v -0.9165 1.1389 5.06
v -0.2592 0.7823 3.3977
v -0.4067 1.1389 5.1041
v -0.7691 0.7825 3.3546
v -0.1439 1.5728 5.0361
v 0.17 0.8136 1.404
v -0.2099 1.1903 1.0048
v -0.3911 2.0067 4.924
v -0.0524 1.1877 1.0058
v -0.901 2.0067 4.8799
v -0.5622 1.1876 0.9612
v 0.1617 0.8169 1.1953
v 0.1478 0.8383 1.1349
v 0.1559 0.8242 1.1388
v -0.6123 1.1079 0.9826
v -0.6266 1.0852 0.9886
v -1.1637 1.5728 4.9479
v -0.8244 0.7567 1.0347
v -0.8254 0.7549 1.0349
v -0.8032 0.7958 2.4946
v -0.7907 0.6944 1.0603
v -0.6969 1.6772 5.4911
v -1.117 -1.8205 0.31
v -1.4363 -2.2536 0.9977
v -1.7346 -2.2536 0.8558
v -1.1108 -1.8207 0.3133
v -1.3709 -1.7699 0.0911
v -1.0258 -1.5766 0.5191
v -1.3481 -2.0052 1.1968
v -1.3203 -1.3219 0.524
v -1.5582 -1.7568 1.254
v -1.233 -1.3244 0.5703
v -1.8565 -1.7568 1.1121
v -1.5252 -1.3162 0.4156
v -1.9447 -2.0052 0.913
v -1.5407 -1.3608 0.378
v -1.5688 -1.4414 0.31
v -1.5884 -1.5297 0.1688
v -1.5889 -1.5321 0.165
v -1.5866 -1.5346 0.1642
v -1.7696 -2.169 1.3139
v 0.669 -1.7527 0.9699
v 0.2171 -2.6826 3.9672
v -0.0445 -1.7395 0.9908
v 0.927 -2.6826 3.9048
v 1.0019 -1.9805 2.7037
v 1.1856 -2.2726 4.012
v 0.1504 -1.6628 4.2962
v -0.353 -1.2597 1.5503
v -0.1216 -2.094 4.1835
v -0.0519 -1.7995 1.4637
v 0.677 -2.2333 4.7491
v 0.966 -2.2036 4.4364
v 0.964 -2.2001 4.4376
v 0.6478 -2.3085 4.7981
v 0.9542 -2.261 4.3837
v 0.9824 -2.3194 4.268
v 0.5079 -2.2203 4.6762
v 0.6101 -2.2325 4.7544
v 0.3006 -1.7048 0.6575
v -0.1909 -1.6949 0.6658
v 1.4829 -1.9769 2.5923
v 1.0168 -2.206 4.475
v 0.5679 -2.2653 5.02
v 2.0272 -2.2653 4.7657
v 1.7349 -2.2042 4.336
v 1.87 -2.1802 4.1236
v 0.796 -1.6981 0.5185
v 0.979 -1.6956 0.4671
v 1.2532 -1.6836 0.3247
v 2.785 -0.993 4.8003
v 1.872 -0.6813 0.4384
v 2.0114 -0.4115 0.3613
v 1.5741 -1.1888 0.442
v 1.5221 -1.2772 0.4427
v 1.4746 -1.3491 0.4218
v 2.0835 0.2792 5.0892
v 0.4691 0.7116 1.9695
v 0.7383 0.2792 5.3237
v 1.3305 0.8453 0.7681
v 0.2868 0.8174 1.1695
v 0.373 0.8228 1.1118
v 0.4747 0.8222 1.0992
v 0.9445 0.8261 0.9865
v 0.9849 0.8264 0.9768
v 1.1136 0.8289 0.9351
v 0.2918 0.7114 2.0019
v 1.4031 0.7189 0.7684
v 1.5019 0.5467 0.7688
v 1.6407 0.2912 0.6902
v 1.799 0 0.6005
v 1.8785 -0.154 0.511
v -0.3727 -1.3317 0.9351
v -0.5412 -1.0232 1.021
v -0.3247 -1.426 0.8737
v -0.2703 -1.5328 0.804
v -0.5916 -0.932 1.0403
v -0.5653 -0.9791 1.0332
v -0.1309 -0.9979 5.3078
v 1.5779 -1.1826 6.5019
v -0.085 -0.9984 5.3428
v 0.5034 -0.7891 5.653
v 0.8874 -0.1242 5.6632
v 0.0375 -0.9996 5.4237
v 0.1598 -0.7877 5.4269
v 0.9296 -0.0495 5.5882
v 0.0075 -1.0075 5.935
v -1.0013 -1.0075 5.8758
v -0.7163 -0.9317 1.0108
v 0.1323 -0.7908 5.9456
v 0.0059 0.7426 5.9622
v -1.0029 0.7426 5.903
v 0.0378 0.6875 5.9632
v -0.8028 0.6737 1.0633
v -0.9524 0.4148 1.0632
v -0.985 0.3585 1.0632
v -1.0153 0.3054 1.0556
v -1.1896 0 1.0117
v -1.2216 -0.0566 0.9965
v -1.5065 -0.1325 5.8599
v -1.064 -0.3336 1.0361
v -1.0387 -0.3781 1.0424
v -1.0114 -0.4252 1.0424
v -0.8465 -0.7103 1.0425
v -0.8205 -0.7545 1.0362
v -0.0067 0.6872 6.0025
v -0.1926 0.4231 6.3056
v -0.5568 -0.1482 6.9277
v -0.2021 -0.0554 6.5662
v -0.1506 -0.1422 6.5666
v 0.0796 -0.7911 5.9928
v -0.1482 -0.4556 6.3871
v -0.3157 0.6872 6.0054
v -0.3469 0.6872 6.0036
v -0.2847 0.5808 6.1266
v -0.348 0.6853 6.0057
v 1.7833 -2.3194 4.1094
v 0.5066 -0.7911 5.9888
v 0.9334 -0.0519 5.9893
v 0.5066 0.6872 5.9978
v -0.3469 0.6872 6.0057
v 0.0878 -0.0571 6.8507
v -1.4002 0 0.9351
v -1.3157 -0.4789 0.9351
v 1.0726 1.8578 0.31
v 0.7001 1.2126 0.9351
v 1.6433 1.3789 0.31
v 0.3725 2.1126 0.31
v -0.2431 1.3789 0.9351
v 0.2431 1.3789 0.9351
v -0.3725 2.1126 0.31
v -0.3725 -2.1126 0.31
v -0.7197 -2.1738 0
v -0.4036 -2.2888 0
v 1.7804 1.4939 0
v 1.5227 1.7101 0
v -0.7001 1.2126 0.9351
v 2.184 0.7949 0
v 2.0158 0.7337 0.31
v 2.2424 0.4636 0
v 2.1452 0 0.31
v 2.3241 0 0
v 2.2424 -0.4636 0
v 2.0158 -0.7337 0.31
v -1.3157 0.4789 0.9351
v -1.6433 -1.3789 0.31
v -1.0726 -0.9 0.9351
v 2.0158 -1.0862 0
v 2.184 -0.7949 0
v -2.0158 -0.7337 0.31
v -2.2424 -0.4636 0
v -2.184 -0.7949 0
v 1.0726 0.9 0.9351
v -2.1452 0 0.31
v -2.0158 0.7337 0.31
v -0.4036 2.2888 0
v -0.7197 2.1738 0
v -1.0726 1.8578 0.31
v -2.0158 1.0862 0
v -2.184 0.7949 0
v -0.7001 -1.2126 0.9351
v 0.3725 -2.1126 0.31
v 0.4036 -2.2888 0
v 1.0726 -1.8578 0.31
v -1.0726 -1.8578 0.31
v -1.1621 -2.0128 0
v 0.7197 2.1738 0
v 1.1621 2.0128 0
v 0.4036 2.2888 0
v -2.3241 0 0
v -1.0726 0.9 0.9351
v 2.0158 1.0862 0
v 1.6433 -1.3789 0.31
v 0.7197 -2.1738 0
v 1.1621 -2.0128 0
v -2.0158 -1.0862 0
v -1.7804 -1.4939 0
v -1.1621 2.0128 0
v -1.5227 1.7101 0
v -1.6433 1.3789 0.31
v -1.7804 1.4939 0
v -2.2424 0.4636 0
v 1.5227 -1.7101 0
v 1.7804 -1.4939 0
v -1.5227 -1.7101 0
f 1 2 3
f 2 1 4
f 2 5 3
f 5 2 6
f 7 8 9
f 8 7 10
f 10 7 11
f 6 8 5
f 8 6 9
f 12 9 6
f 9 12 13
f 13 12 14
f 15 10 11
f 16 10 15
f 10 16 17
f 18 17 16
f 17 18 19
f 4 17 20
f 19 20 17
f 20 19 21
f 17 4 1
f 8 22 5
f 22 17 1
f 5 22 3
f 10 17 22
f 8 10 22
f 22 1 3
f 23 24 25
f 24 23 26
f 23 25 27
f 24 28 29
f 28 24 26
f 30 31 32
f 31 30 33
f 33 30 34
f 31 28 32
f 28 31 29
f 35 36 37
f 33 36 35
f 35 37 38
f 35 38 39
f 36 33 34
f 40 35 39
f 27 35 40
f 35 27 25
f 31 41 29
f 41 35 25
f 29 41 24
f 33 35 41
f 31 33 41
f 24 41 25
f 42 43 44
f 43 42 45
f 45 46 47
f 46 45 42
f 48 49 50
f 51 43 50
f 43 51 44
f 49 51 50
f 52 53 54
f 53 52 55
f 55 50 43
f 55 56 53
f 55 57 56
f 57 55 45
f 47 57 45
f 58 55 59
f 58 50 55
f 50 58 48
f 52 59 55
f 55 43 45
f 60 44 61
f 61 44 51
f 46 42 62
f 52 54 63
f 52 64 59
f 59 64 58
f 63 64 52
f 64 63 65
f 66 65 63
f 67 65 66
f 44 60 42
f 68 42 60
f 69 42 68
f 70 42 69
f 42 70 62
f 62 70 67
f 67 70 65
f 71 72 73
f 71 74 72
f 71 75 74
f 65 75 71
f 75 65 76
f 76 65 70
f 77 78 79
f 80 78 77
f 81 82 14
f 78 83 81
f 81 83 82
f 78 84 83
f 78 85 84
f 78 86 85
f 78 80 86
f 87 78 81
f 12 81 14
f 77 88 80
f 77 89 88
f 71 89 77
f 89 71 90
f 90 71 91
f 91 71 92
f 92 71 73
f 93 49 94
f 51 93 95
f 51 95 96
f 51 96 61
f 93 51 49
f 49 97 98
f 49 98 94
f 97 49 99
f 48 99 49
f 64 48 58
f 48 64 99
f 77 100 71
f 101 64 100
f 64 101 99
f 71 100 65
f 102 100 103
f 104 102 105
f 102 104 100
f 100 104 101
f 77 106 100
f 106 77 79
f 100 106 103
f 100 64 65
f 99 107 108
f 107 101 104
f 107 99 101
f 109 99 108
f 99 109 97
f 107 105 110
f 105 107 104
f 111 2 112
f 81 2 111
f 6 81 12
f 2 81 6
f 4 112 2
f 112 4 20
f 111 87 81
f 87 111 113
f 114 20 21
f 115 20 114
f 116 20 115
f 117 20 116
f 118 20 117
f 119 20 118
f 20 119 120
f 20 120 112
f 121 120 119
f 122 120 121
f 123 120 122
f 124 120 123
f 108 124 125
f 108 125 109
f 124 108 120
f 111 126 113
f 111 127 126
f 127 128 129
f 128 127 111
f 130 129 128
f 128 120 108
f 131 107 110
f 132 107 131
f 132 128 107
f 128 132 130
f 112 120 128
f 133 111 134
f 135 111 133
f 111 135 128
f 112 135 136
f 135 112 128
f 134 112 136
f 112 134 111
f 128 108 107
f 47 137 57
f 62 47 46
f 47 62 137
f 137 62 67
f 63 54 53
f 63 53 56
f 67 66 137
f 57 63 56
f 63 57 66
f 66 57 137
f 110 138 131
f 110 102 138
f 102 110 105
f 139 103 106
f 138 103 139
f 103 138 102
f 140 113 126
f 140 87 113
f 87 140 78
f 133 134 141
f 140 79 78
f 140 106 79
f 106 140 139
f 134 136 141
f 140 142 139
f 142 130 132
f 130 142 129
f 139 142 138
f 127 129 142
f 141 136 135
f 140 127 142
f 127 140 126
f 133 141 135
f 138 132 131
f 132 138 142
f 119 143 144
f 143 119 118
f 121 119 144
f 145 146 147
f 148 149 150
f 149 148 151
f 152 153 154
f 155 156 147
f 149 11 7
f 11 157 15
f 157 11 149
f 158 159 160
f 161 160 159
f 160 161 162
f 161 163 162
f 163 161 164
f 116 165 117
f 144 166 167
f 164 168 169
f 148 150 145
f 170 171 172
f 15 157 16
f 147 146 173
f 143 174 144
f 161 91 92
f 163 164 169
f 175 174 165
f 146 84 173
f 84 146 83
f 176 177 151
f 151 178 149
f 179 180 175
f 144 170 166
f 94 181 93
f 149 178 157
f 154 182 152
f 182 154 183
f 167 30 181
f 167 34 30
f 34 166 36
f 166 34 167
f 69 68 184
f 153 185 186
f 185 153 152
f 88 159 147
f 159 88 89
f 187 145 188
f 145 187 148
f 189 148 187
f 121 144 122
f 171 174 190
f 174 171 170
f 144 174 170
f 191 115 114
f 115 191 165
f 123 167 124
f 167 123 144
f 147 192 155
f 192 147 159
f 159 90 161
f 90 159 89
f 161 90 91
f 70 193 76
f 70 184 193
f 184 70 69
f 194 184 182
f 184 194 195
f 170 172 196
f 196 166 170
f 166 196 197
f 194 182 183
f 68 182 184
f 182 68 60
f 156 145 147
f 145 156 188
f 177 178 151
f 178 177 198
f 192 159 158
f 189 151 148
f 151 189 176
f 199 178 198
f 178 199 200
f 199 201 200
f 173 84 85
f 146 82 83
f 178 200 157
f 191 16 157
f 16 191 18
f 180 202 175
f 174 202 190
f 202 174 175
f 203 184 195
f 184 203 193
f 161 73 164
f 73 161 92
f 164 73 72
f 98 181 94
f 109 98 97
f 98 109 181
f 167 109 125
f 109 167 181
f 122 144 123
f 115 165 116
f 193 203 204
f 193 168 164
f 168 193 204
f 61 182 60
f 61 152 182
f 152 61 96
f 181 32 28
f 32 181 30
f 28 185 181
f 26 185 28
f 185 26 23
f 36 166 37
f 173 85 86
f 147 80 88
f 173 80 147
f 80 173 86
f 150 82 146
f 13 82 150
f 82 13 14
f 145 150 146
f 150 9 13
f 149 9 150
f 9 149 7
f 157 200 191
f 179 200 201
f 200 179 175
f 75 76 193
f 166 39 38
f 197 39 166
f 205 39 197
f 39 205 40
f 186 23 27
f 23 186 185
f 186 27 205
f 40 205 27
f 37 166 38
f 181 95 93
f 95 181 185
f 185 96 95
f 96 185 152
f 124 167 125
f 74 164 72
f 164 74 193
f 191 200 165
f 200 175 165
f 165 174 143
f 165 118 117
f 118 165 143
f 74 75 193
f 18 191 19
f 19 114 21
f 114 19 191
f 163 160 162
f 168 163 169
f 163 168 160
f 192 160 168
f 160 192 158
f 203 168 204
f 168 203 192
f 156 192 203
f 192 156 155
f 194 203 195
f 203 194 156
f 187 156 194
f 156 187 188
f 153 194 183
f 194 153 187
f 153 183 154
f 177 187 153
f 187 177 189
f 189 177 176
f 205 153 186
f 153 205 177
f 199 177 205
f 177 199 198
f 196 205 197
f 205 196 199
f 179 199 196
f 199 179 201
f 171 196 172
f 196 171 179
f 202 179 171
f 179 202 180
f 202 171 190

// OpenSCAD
//Customizable Tothite
//Inspired by "Giant Crystal" (http://www.thingiverse.com/thing:189703) by Tothe (http://www.thingiverse.com/Tothe/designs)
//Using modified code written by me in (http://www.thingiverse.com/thing:142079)
//Created by Ari M. Diacou, November 2013
//Shared under Creative Commons License: Attribution-ShareAlike 3.0 Unported (CC BY-SA 3.0) 
//see http://creativecommons.org/licenses/by-sa/3.0/


//A way to save your "random" arrangement
seed=5;				
//Number of crystals
num=8;							
//Minimum width of crystals
min_width=.5;
//Minimum width of crystals
max_width=3;
//Height of each crystal
high=6;
//Number of sides on each crystal
num_sides=6;
//Lower numbers will have shorter outer crystals
dropoff=.8;
//Overhang angle of the outermost crystals
bouquet_angle=40;
//The density of the crystals
density=10;
//For fine-tuning the width of the base
base_width=7; //[0:10]

R_max=(.1*base_width*max_width+.1*(10-base_width)*min_width)*num/density;
angle=rands(0,360*10,num+1,seed); //The azimuthal angle that the axis of the crystal will be at
crystal_length=rands(0,R_max,num+1,seed+2); 
crystal_width=rands(min_width,max_width,num+1,seed+1);
hyp=R_max/sin(bouquet_angle);
adj=R_max*cos(bouquet_angle)/sin(bouquet_angle);
difference(){
	union(){
		translate([0,0,-2*adj+hyp]) 
			sphere(hyp,$fn=3*num_sides);
		for(i=[1:num]){
			translate([crystal_length[i]*cos(angle[i]),crystal_length[i]*sin(angle[i]),0]) 
				rotate([-bouquet_angle*sin(angle[i])*crystal_length[i]/R_max,bouquet_angle*cos(angle[i])*crystal_length[i]/R_max,0])
					crystal(num_sides,high*exp(-pow((crystal_length[i]/(dropoff*R_max)),2)),crystal_width[i]/2,crystal_width[i]/2);
		}
	}
	translate([0,0,-.5*max_width*hyp]) 
		cube(max_width*hyp,true);
	}

module crystal(sides, height, width, taper_height){
	cylinder(height,width,width,$fn=sides);
	translate([0,0,height]) 
		cylinder(taper_height,width,0*width/2,$fn=sides);
	}
